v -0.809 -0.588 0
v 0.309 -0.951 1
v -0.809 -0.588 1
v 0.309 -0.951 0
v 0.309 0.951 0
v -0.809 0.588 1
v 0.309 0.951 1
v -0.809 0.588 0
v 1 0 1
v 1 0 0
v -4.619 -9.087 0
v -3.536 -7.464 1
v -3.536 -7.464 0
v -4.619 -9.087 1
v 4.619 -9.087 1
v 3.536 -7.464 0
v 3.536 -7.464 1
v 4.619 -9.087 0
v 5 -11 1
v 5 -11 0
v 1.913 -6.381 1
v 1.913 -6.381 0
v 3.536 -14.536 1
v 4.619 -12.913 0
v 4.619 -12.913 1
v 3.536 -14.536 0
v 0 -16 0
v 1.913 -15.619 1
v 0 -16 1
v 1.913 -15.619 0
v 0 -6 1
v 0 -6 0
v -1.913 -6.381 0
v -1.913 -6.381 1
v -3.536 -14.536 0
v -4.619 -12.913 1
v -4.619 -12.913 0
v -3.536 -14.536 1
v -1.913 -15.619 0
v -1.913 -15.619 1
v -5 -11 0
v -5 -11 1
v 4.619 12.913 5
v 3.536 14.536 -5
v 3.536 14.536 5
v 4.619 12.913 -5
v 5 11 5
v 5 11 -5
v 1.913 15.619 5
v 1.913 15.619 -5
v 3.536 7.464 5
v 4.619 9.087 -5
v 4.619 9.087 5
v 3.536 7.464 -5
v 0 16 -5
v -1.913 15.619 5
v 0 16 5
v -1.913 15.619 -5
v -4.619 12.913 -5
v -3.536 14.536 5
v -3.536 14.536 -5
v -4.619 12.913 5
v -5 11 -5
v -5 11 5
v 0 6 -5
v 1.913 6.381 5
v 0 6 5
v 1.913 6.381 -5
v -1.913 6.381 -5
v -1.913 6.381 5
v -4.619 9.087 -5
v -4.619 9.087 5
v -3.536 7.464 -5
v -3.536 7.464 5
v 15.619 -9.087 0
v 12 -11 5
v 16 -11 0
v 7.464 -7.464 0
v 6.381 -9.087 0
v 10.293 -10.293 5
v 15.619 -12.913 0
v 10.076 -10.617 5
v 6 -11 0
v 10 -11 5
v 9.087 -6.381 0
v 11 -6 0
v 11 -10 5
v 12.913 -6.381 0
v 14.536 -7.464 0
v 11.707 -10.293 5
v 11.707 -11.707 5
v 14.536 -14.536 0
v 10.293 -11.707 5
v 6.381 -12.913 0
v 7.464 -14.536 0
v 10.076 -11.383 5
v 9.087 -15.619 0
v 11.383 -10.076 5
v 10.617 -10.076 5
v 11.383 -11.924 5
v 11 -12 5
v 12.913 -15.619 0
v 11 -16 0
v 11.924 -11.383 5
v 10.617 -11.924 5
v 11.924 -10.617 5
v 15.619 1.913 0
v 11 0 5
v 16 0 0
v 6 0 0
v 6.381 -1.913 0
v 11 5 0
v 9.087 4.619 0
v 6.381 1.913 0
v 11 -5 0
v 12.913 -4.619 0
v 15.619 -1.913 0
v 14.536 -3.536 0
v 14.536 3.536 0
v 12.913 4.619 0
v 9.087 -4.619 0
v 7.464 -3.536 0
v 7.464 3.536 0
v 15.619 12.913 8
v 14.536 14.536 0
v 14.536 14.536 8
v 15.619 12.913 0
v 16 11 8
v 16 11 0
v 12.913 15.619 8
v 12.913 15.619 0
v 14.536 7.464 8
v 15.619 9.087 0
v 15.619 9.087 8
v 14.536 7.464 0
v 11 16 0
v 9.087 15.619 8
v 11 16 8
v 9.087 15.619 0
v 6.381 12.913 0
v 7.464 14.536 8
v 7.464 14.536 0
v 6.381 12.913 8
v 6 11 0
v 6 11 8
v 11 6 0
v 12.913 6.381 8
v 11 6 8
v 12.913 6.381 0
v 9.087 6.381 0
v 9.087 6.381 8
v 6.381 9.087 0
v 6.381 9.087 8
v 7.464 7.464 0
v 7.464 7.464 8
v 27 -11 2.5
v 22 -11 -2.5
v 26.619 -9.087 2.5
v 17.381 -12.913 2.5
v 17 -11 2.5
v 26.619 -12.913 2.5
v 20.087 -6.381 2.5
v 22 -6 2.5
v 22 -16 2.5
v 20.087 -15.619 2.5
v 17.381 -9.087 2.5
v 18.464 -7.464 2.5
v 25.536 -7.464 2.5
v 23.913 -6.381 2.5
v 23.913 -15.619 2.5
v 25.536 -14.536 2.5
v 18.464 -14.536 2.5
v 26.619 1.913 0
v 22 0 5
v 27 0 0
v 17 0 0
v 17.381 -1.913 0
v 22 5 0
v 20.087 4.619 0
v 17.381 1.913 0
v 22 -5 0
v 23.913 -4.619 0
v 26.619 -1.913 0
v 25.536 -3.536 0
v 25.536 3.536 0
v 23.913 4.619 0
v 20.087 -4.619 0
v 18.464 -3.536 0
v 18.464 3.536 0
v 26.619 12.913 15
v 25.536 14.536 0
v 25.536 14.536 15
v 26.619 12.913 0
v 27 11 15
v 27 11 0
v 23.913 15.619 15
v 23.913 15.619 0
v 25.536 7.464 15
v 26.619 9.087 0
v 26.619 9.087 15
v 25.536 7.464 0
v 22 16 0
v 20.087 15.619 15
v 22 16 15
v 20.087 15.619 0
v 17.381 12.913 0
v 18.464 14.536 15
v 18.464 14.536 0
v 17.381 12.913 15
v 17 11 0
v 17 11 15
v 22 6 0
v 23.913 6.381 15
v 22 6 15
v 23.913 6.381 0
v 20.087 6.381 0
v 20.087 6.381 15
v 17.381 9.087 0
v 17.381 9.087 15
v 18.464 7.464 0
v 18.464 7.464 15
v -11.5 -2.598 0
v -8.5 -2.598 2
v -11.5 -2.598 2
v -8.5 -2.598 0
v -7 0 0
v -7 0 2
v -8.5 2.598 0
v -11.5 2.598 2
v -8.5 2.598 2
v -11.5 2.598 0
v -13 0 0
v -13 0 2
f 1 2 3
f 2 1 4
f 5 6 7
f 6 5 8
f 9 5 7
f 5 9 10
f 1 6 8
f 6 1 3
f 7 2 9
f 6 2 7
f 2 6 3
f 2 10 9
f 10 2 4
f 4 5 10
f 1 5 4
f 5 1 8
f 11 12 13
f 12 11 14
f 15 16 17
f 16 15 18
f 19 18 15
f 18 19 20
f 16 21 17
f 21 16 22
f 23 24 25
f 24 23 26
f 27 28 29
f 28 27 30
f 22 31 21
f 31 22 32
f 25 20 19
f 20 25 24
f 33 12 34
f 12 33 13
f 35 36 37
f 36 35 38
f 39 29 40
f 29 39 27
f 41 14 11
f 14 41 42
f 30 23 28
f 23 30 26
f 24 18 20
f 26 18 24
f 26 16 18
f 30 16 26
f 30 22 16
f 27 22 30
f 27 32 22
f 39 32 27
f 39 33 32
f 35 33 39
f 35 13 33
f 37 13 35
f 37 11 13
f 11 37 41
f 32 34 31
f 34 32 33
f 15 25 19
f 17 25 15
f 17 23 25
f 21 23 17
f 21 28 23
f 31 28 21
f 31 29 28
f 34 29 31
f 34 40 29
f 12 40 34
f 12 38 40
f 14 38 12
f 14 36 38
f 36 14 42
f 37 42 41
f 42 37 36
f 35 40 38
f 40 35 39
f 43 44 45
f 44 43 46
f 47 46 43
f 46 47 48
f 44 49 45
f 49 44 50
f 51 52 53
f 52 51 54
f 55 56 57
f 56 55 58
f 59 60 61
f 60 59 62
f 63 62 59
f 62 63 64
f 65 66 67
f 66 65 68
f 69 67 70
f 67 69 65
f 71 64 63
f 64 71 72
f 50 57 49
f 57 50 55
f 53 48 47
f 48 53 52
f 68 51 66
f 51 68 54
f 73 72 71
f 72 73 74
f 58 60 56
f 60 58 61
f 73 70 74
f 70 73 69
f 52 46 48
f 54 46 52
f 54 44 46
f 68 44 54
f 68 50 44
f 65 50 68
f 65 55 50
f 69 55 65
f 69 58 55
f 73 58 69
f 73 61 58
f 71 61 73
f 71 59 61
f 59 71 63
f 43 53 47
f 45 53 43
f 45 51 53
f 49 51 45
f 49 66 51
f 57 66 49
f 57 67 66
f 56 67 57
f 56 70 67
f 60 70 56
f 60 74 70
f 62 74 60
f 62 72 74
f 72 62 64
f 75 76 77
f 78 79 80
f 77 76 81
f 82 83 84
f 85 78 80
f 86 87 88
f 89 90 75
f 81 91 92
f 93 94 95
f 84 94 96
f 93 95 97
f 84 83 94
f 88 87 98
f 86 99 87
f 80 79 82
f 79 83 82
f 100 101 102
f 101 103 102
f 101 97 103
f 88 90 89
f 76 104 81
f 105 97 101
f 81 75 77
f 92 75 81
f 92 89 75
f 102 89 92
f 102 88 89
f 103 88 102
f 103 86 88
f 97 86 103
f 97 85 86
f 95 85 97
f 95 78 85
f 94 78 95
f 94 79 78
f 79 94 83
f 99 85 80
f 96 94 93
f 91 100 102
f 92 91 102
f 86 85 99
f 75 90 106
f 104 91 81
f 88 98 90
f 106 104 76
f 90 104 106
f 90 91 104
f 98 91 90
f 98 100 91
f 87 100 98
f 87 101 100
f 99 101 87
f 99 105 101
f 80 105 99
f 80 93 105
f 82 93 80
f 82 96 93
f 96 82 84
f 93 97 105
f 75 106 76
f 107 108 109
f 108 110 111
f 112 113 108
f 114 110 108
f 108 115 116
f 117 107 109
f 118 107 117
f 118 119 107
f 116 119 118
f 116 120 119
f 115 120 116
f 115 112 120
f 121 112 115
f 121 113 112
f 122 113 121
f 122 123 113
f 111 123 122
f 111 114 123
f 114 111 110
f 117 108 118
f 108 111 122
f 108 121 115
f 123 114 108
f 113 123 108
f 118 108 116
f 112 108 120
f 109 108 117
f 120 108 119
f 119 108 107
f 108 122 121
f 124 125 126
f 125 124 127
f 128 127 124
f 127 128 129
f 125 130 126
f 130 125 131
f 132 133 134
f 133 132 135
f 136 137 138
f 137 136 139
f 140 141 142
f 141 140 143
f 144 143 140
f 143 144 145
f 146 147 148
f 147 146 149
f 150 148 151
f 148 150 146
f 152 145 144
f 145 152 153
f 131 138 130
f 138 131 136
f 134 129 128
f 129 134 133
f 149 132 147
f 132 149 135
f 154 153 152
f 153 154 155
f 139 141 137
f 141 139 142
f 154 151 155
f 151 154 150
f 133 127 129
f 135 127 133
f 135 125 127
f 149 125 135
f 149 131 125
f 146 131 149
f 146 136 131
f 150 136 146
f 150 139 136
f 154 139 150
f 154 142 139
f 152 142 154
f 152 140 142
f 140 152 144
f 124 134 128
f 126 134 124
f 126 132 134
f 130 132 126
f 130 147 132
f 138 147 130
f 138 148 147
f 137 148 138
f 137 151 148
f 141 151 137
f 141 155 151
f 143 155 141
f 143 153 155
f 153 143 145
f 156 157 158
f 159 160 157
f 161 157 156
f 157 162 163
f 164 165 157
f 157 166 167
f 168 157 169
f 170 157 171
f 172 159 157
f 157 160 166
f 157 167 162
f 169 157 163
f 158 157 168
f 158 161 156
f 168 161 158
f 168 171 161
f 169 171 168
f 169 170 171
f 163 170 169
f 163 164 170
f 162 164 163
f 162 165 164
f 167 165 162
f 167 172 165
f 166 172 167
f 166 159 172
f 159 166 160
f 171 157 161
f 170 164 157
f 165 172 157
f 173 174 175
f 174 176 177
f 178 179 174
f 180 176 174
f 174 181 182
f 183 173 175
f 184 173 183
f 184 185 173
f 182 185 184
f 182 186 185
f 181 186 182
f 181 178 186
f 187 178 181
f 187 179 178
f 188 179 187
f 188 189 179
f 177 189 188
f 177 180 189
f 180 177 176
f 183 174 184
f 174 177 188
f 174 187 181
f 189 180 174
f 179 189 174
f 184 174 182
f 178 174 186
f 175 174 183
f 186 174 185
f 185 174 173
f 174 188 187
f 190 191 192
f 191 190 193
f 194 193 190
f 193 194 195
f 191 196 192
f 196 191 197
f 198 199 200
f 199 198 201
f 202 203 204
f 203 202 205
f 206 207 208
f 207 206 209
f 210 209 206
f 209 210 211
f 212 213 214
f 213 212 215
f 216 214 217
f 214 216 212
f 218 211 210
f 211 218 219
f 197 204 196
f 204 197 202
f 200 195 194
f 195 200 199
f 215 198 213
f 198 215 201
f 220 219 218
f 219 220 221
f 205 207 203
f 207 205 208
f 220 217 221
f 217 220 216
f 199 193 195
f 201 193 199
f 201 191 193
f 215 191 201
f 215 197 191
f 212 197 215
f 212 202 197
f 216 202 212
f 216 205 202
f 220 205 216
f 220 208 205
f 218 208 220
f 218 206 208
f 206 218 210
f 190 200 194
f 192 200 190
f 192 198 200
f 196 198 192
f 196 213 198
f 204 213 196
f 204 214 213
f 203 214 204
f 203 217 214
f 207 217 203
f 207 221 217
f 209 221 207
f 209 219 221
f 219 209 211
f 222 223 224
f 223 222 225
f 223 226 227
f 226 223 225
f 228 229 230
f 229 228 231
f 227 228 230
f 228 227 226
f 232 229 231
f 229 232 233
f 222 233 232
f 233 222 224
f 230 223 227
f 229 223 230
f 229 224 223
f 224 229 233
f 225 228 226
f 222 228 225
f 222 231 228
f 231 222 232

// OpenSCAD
cylinder();
translate([1,0,0]) cylinder(r=0);
translate([2,0,0]) cylinder(r1=0, r2=0);
translate([0,-11,0]) cylinder(r=5);
translate([0,11,0]) cylinder(r=5, h=10, center=true);

translate([11,-11,0]) cylinder(h=5, r1=5);
translate([11,0,0]) cylinder(h=5, r1=5, r2=0);
translate([11,11,0]) cylinder(h=8, r1=5, r2=5);

translate([22,-11,0]) cylinder(h=5, r=5, r1=0, center=true);
translate([22,0,0]) cylinder(h=5, r=5, r2=0);
translate([22,11,0]) cylinder(h=15, r=5, r2=5);

// This tests for hexagonal cylinder orientation, since people
// tend to "abuse" this for captured nut slots
translate([-10,0,0]) cylinder(h=2, r=3, $fn=6);


// FIXME: We could test $fs, $fa, $fn as well
